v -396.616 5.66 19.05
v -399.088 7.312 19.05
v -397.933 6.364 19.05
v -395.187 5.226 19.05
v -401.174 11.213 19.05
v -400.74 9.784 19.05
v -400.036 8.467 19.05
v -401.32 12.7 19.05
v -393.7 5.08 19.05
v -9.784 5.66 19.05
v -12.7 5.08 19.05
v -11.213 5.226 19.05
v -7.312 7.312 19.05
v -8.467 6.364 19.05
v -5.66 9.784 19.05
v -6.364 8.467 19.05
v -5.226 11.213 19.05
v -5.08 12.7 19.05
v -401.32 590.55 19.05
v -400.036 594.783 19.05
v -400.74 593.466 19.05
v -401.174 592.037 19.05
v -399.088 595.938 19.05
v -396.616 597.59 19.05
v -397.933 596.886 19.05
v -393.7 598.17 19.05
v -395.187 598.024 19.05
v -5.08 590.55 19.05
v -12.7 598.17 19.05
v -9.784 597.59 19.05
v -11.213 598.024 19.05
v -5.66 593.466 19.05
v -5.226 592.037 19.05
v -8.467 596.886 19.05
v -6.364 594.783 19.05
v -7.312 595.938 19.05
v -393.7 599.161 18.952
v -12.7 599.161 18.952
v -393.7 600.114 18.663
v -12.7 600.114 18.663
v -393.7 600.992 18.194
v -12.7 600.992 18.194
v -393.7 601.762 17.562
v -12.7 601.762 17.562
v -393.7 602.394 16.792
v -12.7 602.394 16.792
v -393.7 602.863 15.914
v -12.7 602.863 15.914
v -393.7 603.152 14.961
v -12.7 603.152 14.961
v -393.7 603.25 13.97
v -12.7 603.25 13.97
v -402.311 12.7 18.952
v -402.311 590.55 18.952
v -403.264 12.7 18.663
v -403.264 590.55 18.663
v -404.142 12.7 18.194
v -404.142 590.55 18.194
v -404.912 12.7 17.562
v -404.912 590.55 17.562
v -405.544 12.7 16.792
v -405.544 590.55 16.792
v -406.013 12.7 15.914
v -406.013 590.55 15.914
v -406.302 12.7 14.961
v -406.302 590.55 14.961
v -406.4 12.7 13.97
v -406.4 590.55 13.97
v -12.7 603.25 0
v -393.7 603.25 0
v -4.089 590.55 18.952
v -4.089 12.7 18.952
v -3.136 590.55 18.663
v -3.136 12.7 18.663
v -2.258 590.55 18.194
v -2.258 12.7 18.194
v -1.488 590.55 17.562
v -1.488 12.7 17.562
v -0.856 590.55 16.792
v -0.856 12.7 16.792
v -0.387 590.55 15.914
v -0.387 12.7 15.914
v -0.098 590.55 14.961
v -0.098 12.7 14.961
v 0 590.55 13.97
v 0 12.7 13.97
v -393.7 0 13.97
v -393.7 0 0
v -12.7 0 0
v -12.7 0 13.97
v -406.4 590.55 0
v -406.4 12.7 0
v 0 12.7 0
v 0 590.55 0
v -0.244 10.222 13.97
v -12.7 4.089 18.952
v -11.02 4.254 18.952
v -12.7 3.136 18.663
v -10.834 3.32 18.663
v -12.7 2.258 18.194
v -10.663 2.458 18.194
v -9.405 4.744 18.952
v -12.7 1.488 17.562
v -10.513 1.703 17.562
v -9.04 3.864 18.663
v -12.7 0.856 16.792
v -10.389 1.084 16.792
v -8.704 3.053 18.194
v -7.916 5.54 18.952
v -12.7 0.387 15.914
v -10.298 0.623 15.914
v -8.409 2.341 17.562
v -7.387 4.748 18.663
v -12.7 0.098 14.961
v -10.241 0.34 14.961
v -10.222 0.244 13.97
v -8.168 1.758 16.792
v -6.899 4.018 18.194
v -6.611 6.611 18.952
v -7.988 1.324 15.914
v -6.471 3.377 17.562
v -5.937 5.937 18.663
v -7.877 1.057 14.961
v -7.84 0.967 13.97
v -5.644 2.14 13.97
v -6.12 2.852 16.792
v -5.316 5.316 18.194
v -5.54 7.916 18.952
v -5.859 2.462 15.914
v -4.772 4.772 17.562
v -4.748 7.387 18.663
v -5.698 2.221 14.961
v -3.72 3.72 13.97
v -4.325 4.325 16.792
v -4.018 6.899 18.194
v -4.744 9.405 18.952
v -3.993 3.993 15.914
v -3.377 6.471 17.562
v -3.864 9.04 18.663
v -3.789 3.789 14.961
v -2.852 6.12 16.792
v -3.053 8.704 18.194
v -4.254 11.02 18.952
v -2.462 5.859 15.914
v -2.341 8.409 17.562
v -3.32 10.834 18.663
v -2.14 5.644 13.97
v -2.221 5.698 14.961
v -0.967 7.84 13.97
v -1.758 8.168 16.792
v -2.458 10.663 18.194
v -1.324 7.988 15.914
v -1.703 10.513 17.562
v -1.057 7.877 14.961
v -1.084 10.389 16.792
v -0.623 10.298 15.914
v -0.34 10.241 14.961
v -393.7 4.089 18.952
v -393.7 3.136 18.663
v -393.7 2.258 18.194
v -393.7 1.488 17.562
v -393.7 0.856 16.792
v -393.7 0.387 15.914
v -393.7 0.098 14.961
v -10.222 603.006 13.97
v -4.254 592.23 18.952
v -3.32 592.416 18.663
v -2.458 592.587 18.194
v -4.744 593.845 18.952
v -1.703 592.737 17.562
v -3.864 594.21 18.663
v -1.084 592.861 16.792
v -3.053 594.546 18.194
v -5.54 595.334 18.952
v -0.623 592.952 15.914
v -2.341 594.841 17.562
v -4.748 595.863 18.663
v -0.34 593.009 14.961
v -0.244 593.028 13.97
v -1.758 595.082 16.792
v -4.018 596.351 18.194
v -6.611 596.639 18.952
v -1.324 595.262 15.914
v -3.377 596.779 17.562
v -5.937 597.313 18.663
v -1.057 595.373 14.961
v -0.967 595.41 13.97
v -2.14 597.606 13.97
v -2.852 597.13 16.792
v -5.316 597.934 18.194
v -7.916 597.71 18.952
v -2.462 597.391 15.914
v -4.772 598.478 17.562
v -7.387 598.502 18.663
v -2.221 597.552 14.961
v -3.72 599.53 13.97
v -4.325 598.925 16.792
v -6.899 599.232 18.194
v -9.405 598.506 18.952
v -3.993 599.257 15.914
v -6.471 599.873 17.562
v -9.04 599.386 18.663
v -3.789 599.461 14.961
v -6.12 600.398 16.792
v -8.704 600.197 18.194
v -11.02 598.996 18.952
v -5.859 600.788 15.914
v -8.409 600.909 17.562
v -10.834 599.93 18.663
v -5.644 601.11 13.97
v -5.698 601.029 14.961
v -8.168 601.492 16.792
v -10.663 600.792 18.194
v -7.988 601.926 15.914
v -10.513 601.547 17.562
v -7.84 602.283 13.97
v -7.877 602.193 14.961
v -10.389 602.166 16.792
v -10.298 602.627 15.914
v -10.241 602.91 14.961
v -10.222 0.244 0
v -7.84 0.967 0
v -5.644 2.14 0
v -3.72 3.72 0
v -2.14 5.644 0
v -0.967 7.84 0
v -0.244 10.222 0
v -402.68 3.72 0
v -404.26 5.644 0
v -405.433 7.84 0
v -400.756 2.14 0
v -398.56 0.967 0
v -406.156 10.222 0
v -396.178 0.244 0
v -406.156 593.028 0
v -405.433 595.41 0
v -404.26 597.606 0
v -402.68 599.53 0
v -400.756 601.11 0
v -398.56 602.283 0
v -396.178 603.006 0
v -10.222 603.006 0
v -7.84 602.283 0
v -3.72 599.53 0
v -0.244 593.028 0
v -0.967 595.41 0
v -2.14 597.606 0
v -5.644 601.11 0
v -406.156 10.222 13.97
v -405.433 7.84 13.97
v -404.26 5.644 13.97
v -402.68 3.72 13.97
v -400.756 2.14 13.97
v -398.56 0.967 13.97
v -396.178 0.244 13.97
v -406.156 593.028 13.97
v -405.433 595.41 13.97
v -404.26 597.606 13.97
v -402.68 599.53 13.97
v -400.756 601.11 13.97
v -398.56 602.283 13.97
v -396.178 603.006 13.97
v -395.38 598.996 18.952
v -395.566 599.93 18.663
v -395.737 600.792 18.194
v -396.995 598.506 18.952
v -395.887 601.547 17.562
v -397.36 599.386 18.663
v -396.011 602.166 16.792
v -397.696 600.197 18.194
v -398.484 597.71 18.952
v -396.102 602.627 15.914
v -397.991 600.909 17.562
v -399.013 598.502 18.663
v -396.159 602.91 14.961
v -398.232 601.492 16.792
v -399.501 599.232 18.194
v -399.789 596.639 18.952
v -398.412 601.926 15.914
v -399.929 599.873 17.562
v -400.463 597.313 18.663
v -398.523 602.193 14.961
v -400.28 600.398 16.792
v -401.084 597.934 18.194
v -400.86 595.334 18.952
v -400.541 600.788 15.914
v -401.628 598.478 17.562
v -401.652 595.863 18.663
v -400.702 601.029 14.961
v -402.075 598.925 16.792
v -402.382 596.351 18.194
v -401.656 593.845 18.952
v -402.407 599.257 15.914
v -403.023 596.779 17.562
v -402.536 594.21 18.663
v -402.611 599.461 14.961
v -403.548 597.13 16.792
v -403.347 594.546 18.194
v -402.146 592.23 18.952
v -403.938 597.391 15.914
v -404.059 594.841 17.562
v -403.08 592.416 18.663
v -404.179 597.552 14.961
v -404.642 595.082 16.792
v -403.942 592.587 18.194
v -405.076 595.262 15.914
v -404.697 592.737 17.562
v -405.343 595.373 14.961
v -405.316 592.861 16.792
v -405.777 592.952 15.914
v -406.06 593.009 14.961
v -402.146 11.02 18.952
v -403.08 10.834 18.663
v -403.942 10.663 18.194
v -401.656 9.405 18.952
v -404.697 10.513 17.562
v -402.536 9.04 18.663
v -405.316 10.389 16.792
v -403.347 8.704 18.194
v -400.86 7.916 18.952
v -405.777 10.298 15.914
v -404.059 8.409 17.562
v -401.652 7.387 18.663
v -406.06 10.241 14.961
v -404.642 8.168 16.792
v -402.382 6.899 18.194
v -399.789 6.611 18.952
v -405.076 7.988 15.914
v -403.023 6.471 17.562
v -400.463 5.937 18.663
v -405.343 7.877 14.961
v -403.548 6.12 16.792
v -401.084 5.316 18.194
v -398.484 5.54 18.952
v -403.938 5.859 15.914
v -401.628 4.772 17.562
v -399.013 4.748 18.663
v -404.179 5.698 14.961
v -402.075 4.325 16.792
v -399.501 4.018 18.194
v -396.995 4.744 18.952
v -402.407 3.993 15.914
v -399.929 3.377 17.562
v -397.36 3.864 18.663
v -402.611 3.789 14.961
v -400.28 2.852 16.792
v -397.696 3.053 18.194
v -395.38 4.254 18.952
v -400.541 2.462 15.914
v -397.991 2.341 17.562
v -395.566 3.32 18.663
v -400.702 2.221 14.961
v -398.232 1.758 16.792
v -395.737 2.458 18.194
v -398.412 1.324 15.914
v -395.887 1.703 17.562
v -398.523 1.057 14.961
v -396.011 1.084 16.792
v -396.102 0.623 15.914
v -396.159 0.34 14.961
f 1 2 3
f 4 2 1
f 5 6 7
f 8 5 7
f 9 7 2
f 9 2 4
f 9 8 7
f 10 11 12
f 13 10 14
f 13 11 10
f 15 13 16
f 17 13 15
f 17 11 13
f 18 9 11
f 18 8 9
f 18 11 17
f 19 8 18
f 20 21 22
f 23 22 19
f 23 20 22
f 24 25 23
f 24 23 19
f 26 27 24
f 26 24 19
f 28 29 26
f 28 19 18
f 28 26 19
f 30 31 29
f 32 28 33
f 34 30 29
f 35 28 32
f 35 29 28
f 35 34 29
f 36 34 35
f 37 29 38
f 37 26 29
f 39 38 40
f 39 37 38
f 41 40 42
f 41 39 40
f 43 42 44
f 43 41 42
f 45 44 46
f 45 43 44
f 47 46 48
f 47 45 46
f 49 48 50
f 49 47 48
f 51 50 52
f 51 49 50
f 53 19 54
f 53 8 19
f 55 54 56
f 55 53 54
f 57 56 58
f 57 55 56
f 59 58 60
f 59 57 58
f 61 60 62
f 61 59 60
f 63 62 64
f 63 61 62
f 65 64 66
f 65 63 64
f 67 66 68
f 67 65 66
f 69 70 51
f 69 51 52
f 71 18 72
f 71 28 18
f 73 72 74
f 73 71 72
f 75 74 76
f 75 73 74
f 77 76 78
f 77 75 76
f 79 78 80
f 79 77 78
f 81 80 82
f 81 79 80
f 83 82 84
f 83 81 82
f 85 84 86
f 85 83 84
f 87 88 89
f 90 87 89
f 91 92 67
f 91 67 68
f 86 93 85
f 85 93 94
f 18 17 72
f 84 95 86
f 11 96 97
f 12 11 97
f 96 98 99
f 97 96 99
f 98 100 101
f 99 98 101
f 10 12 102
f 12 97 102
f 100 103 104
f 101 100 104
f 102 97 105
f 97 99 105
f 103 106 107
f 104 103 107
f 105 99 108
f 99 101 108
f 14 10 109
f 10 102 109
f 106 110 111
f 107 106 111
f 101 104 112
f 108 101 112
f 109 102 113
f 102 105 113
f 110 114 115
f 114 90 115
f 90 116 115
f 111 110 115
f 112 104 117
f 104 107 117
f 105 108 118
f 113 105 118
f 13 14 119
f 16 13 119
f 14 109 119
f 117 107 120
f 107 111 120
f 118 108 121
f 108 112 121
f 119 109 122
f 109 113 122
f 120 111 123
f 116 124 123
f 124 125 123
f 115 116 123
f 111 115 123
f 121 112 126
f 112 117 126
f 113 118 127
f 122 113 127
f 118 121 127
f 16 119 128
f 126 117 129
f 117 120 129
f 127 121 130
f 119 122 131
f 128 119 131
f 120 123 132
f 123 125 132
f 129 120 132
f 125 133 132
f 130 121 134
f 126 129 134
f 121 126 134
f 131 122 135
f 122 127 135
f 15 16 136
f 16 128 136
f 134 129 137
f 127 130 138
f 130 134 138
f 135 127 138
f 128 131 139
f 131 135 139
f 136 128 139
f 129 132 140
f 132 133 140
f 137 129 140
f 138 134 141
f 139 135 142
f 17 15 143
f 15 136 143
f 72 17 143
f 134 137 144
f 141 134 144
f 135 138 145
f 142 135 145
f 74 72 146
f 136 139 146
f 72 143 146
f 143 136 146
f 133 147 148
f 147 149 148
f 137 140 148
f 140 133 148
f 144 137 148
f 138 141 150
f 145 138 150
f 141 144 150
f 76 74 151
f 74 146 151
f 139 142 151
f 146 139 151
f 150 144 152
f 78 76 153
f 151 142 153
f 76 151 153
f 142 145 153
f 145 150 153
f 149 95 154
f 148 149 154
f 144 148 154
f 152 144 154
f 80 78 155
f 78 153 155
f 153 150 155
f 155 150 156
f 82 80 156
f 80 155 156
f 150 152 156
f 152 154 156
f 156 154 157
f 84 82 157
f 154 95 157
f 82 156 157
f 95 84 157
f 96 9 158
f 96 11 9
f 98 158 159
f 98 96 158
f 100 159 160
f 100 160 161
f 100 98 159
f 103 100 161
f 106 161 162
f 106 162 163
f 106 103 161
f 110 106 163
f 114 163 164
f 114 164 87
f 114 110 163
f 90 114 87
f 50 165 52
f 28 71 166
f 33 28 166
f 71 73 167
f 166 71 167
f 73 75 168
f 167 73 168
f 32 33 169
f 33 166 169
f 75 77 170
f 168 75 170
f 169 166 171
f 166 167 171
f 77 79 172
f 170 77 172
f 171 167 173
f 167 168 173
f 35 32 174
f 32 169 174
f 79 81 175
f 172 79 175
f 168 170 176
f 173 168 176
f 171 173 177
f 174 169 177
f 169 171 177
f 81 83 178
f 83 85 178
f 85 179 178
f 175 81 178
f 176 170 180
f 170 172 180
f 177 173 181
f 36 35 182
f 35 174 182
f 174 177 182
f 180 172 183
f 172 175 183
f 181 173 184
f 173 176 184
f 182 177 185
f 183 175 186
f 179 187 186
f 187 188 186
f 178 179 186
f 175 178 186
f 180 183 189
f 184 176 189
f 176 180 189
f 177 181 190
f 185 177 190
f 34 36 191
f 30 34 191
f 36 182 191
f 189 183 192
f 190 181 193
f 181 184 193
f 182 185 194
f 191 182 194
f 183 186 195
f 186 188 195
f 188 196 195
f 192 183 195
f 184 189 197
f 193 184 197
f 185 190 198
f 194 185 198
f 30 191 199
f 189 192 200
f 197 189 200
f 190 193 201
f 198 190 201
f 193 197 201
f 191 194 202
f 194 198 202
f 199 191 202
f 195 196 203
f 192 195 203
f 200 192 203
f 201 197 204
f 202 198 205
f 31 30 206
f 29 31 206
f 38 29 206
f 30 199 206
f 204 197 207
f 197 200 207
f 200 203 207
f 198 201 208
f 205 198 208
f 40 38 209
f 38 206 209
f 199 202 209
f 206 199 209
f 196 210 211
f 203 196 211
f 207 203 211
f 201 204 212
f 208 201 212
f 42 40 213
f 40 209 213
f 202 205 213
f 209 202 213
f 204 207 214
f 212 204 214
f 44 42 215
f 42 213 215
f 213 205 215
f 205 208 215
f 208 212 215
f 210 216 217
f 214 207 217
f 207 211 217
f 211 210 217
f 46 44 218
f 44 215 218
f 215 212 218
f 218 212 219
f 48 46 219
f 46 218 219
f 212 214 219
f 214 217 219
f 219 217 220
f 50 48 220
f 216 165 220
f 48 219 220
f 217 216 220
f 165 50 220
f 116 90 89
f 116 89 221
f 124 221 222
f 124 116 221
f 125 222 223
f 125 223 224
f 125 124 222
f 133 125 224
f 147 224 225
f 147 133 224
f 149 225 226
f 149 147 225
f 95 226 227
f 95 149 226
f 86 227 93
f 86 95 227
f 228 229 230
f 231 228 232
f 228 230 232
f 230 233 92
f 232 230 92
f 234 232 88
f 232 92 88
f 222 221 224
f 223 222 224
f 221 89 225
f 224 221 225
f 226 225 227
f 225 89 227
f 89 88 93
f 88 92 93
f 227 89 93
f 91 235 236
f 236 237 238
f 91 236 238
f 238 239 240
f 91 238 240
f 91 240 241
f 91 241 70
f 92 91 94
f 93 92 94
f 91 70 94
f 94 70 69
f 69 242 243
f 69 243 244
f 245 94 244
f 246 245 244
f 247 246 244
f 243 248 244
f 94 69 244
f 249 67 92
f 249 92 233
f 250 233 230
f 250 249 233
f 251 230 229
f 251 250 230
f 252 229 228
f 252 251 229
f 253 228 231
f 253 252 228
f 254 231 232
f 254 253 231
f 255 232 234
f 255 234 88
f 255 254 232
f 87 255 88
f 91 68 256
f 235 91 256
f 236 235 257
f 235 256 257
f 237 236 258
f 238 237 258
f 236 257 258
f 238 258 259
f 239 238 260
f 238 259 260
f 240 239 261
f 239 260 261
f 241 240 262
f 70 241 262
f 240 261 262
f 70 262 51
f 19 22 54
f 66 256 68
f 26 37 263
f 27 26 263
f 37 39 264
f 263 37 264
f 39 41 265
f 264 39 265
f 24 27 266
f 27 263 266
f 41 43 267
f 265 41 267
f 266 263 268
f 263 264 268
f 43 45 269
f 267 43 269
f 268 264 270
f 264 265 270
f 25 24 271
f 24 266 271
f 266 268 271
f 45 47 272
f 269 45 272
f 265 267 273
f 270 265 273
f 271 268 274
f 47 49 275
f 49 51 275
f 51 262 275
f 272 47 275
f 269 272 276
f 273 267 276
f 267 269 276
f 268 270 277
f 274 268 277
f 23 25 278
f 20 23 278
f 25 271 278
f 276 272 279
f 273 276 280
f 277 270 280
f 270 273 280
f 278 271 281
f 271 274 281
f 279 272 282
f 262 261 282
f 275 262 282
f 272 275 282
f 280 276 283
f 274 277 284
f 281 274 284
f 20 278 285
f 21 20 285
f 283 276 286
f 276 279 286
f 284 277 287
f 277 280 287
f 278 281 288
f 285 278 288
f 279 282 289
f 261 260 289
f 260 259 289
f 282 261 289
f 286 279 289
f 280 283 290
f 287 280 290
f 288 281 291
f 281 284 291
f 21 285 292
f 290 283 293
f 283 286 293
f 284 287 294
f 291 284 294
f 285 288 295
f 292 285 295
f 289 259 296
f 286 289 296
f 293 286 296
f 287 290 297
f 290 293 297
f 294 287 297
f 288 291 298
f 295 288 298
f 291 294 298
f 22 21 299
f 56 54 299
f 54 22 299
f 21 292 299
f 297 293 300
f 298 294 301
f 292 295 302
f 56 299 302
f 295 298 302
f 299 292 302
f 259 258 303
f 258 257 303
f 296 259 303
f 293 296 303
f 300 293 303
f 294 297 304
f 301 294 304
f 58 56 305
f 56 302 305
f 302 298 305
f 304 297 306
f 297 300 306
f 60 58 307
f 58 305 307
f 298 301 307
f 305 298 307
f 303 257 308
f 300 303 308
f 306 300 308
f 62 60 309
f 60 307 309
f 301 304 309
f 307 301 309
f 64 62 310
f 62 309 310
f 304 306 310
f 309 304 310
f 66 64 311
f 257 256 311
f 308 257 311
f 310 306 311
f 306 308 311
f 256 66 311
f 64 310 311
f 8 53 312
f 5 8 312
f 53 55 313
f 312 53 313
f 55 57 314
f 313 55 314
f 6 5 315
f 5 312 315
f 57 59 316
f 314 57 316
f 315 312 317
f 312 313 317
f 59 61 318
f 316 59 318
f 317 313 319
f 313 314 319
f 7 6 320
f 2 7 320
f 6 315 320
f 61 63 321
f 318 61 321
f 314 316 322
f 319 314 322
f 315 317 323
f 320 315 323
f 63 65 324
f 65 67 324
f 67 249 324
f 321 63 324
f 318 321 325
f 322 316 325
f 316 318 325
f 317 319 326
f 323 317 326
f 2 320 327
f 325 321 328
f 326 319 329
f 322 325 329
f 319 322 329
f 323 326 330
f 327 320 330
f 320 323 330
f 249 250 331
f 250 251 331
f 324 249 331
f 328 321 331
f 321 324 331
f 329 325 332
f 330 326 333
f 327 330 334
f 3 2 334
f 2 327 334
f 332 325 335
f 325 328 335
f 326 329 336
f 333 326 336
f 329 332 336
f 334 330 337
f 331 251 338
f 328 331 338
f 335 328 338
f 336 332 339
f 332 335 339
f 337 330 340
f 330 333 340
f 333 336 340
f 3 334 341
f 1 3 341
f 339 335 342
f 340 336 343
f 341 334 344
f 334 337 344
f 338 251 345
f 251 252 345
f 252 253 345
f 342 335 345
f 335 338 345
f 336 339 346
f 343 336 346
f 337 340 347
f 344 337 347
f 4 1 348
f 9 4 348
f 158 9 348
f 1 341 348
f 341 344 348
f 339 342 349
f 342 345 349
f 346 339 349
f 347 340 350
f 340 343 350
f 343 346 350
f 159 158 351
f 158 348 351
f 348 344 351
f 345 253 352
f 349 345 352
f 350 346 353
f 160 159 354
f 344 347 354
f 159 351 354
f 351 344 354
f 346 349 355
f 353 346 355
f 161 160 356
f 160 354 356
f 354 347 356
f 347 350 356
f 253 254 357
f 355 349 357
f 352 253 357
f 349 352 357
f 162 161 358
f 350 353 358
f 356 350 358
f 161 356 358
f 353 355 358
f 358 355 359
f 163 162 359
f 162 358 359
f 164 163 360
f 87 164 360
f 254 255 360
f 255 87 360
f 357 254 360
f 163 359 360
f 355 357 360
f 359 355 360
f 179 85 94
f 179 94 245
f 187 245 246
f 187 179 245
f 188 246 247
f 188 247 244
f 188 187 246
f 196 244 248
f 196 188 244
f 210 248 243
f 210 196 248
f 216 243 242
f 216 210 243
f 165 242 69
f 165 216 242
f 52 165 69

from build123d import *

# Parameters (mm, degrees)
F0_W     = 406.4
F0_H     = 603.25
F1_DEPTH = 19.05
F2_R     = 12.7
F3_R     = 5.08


with BuildPart() as f1:
    # F0 (on Top) → F1 (new body)
    with BuildSketch(Plane.XY):
        with Locations((-203.2, 301.625)):
            Rectangle(F0_W, F0_H)
    extrude(amount=F1_DEPTH)

    # F2
    f2_edges = [f1.edges().sort_by_distance(p)[0] for p in [
        (-406.4, 0, 9.525),
        (0, 0, 9.525),
        (0, 603.25, 9.525),
        (-406.4, 603.25, 9.525),
    ]]
    fillet(f2_edges, radius=F2_R)

    # F3
    f3_edges = [f1.edges().sort_by_distance(p)[0] for p in [
        (-203.2, 0, 19.05),
    ]]
    fillet(f3_edges, radius=F3_R)


solid = f1.part
